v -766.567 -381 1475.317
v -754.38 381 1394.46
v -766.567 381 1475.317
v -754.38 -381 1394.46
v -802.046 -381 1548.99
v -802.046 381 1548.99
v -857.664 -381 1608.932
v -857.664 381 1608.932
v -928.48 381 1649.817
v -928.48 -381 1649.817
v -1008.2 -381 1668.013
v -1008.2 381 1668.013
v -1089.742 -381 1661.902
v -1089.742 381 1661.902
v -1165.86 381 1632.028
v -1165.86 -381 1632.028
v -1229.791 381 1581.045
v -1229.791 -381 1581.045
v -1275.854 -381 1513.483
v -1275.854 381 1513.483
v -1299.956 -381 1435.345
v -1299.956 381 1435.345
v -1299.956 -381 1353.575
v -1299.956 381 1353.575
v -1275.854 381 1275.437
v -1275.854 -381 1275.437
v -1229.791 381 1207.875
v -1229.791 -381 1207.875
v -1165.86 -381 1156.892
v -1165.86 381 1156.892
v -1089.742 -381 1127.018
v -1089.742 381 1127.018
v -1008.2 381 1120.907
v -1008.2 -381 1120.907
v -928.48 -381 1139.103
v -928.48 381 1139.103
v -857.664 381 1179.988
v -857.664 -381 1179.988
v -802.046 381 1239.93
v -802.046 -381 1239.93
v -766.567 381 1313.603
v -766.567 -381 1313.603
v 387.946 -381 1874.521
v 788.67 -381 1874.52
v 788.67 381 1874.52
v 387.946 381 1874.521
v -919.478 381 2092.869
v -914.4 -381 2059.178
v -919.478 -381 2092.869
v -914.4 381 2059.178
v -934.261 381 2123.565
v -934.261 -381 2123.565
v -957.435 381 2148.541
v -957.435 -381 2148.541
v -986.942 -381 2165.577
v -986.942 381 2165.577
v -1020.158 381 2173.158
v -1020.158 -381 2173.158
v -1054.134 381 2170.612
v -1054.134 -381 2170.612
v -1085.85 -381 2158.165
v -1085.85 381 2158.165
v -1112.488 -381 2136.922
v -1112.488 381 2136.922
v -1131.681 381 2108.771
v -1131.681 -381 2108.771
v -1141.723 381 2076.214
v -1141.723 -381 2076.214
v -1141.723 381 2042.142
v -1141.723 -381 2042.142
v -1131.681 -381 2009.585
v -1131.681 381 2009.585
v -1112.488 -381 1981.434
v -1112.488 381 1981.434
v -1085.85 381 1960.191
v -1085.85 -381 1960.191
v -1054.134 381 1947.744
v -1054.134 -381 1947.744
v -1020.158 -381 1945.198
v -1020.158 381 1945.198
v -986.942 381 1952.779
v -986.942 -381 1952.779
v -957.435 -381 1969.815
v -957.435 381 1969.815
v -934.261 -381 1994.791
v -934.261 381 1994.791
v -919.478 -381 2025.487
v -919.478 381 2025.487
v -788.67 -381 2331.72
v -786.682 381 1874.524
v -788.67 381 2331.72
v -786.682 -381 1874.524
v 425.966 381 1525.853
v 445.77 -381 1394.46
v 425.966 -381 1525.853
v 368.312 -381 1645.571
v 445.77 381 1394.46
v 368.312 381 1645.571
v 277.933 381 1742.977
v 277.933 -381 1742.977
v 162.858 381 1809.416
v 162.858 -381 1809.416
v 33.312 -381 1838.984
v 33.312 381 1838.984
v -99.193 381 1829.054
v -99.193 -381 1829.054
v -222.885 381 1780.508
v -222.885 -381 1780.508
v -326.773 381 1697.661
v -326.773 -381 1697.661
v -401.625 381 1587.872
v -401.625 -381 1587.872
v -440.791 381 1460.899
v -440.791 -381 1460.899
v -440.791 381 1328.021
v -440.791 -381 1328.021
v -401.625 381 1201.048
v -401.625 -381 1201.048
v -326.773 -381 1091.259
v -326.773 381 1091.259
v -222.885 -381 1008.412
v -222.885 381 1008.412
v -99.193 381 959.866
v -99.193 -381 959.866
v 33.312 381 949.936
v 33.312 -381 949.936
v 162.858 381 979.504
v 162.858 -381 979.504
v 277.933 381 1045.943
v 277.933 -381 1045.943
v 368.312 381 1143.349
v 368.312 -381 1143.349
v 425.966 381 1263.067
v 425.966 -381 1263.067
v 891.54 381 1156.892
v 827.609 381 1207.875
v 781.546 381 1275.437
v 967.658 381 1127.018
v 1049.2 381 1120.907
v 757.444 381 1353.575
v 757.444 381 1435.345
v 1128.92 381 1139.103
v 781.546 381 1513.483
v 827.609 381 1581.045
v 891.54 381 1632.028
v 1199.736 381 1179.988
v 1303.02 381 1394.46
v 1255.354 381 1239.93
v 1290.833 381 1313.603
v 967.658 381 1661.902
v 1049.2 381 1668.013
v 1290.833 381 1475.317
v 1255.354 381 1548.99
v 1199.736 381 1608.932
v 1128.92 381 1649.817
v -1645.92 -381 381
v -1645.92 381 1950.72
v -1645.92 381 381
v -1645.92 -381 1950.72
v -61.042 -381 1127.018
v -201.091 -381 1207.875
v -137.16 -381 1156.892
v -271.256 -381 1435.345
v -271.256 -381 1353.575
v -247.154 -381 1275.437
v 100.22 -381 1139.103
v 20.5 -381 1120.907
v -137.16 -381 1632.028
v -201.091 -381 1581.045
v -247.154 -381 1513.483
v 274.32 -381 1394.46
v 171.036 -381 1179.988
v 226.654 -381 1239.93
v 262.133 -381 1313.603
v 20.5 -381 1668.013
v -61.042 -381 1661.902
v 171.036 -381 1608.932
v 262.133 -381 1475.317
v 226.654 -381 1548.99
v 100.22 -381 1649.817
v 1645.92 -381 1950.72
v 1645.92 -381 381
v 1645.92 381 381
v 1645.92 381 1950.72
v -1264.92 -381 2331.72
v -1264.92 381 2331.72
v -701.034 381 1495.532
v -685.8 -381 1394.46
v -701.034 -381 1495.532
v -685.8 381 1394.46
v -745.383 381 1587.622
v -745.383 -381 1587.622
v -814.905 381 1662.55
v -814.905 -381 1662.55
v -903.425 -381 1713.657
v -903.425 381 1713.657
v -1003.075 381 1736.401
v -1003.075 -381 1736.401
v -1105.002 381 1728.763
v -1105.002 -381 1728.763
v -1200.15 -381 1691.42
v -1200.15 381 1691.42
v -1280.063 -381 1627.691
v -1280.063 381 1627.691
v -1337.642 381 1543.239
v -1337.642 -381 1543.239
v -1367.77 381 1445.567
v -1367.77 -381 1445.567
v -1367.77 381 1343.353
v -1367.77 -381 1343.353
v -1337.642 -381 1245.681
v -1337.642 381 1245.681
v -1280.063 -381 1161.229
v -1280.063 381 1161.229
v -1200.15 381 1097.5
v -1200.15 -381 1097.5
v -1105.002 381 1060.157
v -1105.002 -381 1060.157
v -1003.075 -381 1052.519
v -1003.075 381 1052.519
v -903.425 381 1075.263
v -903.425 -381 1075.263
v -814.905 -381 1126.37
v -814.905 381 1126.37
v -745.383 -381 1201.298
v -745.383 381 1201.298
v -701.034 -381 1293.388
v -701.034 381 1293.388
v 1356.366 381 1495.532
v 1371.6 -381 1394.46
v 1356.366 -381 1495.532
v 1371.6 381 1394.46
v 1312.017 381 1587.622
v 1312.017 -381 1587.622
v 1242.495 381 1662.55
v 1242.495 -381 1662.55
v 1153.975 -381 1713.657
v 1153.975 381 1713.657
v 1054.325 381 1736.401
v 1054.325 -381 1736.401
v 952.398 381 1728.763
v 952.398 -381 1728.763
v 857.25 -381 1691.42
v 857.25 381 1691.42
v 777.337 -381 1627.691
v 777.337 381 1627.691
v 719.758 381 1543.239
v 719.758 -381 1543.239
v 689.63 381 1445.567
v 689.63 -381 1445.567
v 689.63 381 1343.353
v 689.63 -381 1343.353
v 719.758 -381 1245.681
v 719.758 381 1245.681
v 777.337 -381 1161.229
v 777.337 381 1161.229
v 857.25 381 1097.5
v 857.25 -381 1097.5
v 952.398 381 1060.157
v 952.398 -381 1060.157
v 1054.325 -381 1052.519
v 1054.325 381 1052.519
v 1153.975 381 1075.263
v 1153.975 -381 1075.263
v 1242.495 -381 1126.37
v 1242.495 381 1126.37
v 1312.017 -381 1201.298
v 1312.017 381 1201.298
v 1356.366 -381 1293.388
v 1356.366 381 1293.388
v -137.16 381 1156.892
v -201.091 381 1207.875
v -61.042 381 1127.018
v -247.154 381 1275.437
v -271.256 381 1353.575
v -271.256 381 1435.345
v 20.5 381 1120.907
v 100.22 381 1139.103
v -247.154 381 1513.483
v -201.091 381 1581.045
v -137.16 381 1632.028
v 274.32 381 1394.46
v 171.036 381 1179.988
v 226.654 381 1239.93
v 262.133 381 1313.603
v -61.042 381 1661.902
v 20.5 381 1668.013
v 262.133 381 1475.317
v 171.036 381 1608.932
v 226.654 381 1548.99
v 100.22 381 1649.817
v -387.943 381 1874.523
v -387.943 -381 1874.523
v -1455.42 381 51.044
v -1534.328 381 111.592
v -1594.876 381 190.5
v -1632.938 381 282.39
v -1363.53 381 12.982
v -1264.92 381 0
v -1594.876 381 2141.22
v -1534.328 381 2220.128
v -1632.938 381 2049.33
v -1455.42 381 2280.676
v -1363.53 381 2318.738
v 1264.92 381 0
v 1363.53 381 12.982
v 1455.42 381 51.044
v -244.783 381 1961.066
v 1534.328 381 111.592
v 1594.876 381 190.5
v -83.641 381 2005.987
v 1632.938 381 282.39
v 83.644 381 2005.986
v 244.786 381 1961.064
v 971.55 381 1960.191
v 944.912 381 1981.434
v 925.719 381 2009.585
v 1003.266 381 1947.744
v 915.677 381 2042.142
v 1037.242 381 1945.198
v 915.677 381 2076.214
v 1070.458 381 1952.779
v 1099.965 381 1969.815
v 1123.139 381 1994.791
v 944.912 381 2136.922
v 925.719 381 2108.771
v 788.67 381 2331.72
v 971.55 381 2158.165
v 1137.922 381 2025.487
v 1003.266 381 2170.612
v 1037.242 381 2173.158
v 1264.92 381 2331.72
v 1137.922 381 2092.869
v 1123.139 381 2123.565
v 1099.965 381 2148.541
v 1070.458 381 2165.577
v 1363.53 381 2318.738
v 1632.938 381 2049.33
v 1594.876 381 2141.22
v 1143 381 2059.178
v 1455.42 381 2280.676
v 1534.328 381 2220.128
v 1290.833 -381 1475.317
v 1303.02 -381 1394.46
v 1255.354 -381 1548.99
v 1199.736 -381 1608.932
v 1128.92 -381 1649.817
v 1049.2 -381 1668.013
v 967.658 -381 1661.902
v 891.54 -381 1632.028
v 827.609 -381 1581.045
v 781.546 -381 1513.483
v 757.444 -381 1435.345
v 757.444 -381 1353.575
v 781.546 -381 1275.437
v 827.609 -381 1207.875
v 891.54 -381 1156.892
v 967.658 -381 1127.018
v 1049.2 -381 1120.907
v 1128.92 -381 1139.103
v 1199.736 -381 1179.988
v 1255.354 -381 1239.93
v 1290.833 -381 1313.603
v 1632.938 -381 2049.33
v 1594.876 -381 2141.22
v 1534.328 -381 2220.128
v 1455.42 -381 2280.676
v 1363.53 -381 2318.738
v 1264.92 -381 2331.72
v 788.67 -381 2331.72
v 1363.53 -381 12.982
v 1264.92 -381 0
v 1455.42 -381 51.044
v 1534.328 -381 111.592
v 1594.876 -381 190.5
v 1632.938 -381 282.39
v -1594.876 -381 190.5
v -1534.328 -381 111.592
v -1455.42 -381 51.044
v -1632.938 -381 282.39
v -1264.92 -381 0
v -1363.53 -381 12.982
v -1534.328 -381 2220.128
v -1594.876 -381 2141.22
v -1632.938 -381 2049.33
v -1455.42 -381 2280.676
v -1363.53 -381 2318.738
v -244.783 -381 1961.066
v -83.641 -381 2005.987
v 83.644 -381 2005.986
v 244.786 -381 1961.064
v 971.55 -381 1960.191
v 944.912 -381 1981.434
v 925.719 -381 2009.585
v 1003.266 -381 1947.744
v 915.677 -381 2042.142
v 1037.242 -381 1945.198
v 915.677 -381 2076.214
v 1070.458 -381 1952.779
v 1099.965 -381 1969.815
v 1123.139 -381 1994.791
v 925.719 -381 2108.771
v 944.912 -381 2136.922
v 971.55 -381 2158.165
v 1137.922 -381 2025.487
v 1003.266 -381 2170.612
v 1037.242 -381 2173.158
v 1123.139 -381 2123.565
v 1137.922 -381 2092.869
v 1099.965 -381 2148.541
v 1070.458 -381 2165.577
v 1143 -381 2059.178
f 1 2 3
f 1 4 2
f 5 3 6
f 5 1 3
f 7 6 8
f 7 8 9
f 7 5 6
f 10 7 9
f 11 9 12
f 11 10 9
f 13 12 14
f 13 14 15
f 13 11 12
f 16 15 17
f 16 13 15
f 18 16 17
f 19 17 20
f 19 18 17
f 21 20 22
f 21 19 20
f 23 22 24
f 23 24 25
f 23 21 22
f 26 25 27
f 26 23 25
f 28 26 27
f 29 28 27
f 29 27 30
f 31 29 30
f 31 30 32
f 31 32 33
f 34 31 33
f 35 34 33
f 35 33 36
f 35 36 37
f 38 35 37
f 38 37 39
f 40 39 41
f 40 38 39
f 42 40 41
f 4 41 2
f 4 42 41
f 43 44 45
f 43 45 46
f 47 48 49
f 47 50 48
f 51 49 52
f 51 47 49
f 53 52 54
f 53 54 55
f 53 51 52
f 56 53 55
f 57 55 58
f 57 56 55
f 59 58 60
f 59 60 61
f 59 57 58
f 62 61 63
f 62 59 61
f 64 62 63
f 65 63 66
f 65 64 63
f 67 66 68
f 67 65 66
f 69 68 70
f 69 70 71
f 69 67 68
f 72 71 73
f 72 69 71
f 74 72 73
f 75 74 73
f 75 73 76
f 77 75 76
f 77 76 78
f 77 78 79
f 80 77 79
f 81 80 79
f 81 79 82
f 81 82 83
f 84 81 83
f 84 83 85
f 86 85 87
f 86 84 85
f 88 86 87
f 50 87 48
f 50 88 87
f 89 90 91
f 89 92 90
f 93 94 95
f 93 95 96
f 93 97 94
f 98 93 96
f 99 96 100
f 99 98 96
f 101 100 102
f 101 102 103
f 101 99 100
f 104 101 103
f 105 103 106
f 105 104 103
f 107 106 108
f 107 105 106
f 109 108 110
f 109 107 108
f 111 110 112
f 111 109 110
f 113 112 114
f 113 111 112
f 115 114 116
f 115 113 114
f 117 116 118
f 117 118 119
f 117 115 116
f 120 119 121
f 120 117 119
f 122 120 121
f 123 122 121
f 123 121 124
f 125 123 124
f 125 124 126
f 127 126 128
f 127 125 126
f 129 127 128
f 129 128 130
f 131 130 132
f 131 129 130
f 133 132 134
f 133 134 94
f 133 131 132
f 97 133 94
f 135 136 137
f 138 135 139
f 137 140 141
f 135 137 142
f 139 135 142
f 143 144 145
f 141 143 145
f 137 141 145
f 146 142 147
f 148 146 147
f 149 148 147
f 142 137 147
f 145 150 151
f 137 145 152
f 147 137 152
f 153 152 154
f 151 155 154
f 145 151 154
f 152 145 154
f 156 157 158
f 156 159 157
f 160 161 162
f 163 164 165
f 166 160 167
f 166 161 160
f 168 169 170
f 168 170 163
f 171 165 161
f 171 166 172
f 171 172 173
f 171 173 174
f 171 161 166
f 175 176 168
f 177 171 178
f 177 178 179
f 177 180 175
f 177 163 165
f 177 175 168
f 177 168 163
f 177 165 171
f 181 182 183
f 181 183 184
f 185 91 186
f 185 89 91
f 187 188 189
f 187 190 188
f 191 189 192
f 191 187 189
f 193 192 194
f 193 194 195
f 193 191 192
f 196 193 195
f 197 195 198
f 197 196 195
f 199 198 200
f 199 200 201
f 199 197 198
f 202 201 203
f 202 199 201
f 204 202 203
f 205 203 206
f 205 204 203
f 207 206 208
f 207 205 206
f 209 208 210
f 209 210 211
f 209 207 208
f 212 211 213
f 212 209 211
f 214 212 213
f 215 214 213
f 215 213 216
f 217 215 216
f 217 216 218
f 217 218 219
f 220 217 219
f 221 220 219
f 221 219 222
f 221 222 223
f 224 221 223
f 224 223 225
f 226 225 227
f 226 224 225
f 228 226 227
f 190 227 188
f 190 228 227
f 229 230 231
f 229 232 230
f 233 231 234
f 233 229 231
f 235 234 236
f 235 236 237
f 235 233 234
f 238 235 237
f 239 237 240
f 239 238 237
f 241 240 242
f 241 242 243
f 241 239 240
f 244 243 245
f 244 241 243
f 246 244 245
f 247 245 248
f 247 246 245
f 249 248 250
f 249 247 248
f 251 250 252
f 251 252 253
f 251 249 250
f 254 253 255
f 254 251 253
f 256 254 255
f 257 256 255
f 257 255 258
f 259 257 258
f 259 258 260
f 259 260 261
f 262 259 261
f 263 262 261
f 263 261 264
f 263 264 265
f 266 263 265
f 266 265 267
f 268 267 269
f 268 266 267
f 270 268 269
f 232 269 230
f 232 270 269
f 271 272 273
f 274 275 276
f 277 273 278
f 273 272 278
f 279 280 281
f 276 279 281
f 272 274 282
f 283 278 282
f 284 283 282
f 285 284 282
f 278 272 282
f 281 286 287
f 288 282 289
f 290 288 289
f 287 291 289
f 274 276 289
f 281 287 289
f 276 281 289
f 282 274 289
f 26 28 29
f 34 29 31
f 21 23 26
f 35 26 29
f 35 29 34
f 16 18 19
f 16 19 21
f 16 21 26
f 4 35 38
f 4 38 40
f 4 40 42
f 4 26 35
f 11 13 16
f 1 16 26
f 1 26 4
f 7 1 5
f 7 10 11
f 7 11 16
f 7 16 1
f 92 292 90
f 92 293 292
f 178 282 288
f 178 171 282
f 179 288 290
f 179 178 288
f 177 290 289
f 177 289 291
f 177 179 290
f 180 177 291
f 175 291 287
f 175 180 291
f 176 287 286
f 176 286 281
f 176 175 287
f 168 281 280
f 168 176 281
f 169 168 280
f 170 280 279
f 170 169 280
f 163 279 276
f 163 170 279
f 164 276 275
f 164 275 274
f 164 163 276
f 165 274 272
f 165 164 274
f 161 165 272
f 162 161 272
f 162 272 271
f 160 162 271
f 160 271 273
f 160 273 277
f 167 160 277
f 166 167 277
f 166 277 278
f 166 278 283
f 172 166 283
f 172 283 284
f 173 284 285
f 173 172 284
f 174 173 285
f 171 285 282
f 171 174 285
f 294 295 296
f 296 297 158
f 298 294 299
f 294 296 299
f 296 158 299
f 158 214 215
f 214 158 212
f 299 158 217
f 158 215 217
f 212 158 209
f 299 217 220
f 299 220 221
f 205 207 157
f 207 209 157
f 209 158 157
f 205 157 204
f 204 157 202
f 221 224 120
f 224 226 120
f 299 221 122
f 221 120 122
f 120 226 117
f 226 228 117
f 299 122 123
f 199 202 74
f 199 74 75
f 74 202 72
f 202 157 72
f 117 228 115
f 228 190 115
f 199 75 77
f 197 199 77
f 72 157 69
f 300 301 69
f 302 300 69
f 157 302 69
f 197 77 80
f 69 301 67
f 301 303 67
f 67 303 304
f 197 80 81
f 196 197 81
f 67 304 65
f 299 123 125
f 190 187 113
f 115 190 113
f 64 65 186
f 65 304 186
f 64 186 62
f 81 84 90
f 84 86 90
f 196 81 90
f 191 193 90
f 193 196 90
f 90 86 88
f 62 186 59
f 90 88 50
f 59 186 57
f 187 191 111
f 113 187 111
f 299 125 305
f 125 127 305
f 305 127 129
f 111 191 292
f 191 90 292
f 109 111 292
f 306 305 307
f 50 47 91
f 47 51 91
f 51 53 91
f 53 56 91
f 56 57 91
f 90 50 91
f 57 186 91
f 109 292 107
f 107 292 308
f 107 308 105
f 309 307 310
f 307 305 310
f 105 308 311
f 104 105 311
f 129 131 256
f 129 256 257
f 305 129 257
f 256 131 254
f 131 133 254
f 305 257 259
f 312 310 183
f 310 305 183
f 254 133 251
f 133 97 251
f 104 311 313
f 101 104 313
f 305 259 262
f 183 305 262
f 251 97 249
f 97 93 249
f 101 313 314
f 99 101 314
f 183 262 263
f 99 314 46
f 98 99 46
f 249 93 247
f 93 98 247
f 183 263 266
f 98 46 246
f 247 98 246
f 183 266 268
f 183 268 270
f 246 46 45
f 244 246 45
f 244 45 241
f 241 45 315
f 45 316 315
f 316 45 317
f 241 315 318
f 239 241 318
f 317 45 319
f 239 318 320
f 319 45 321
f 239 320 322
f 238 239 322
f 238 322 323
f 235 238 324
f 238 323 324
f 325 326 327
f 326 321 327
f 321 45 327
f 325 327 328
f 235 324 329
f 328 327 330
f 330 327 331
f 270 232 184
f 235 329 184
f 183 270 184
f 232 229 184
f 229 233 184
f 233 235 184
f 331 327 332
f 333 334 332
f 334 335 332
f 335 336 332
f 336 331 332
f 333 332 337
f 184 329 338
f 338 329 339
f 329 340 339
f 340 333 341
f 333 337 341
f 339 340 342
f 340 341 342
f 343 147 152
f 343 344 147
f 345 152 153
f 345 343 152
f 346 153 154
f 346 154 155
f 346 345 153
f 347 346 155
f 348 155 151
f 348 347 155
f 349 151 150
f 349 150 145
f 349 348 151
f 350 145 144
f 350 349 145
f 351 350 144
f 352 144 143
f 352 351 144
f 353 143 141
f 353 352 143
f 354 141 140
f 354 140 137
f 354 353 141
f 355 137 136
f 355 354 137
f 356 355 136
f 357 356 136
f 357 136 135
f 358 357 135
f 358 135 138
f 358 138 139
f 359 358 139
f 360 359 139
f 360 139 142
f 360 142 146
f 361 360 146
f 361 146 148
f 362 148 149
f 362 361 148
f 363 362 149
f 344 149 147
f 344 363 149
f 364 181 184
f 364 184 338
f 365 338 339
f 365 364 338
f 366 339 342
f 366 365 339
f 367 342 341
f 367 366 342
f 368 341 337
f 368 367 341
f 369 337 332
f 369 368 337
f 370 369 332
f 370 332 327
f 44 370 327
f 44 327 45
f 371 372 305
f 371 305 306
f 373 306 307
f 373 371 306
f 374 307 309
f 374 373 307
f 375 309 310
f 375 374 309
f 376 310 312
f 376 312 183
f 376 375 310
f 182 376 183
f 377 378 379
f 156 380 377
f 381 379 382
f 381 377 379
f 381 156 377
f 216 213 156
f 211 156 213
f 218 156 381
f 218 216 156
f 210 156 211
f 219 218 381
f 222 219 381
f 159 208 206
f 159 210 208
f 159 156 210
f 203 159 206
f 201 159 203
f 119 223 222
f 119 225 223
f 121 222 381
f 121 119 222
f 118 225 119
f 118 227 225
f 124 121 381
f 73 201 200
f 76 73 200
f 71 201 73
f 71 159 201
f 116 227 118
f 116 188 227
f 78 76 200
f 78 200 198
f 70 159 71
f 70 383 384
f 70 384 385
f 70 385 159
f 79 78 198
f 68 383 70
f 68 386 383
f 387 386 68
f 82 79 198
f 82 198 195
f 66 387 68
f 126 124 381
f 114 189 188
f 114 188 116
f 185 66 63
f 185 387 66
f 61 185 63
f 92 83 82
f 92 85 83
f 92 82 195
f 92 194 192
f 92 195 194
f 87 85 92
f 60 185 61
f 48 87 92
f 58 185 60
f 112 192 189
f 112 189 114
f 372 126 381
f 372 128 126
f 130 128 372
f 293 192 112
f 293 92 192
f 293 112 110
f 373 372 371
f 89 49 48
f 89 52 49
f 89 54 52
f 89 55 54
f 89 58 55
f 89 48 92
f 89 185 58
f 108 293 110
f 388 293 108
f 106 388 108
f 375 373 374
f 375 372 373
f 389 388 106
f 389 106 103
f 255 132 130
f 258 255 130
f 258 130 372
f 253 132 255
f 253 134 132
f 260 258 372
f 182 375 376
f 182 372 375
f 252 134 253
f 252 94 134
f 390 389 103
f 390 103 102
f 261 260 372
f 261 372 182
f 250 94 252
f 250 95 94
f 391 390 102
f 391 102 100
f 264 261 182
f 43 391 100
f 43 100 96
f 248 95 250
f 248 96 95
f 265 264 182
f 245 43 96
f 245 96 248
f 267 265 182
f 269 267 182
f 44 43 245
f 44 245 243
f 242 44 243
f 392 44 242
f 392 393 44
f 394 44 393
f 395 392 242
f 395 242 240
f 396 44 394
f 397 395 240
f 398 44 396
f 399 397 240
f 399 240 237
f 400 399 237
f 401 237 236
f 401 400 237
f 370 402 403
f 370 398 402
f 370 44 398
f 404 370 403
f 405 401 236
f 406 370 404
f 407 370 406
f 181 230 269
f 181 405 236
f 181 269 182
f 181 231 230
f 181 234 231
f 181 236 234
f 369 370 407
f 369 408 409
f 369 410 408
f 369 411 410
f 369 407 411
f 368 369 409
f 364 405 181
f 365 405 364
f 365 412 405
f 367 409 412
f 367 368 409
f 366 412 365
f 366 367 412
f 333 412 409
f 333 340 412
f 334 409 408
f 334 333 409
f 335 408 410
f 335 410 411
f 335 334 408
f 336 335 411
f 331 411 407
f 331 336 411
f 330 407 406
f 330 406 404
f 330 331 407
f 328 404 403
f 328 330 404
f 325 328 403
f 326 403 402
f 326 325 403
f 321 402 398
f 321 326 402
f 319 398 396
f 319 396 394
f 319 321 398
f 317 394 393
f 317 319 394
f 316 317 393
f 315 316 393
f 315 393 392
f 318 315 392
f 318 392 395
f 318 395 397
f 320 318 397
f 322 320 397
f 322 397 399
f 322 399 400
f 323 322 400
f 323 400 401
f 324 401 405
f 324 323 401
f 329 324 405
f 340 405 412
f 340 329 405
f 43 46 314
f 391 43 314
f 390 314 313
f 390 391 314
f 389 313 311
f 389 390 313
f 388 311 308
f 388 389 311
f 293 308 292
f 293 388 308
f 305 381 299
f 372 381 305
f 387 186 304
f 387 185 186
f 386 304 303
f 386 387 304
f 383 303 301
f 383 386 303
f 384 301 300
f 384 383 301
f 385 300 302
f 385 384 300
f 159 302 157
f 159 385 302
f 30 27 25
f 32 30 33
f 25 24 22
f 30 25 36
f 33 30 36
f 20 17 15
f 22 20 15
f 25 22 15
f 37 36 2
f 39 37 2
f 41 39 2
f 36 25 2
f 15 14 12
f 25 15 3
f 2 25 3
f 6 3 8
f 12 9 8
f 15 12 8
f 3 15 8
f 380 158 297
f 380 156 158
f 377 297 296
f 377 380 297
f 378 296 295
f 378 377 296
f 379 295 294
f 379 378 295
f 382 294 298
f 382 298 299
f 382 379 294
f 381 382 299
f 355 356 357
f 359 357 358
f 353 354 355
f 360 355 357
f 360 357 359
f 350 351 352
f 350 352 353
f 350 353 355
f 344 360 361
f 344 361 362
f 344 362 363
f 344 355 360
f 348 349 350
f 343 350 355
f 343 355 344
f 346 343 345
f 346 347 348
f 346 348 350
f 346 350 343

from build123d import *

# Parameters (mm, degrees)
F0_R     = 342.9
F0_R_2   = 114.3
F0_R_3   = 445.77
F1_DEPTH = 381
F0_R_4   = 274.32


with BuildPart() as f1:
    # F0 (on Front) → F1 (new body, symmetric)
    with BuildSketch(Plane.XZ):
        with BuildLine():
            Line((-1264.92, 0), (0, 0))
            Line((0, 0), (1264.92, 0))
            ThreePointArc((1264.92, 0), (1534.3276836321, 111.5923163679), (1645.92, 381))
            Line((1645.92, 381), (1645.92, 1950.72))
            ThreePointArc((1645.92, 1950.72), (1534.3276836321, 2220.1276836321), (1264.92, 2331.72))
            Line((1264.92, 2331.72), (788.67, 2331.72))
            Line((788.67, 2331.72), (788.67, 1874.52))
            Line((788.67, 1874.52), (387.9457039853, 1874.5210994023))
            ThreePointArc((387.9457039853, 1874.5210994023), (0.0016933665, 2011.6799999977), (-387.9430698478, 1874.5232280826))
            Line((-387.9430698478, 1874.5232280826), (-786.6820229085, 1874.5243220381))
            Line((-786.6820229085, 1874.5243220381), (-788.67, 2331.72))
            Line((-788.67, 2331.72), (-1264.92, 2331.72))
            ThreePointArc((-1264.92, 2331.72), (-1534.3276836321, 2220.1276836321), (-1645.92, 1950.72))
            Line((-1645.92, 1950.72), (-1645.92, 381))
            ThreePointArc((-1645.92, 381), (-1534.3276836321, 111.5923163679), (-1264.92, 0))
        make_face()
        with Locations((-1028.7, 1394.46)):
            Circle(F0_R, mode=Mode.SUBTRACT)
        with Locations((-1028.7, 2059.178)):
            Circle(F0_R_2, mode=Mode.SUBTRACT)
        with Locations((0, 1394.46)):
            Circle(F0_R_3, mode=Mode.SUBTRACT)
        with Locations((1028.7, 1394.46)):
            Circle(F0_R, mode=Mode.SUBTRACT)
        with Locations((1028.7, 2059.178)):
            Circle(F0_R_2, mode=Mode.SUBTRACT)
    extrude(amount=F1_DEPTH, both=True)


with BuildPart() as f1b:
    # F0 (on Front) → F1, piece 2 (new body, symmetric)
    with BuildSketch(Plane.XZ):
        with Locations((-1028.7, 1394.46)):
            Circle(F0_R_4)
    extrude(amount=F1_DEPTH, both=True)


with BuildPart() as f1c:
    # F0 (on Front) → F1, piece 3 (new body, symmetric)
    with BuildSketch(Plane.XZ):
        with Locations((0, 1394.46)):
            Circle(F0_R_4)
    extrude(amount=F1_DEPTH, both=True)


with BuildPart() as f1d:
    # F0 (on Front) → F1, piece 4 (new body, symmetric)
    with BuildSketch(Plane.XZ):
        with Locations((1028.7, 1394.46)):
            Circle(F0_R_4)
    extrude(amount=F1_DEPTH, both=True)


solid = Compound([f1.part, f1b.part, f1c.part, f1d.part])
